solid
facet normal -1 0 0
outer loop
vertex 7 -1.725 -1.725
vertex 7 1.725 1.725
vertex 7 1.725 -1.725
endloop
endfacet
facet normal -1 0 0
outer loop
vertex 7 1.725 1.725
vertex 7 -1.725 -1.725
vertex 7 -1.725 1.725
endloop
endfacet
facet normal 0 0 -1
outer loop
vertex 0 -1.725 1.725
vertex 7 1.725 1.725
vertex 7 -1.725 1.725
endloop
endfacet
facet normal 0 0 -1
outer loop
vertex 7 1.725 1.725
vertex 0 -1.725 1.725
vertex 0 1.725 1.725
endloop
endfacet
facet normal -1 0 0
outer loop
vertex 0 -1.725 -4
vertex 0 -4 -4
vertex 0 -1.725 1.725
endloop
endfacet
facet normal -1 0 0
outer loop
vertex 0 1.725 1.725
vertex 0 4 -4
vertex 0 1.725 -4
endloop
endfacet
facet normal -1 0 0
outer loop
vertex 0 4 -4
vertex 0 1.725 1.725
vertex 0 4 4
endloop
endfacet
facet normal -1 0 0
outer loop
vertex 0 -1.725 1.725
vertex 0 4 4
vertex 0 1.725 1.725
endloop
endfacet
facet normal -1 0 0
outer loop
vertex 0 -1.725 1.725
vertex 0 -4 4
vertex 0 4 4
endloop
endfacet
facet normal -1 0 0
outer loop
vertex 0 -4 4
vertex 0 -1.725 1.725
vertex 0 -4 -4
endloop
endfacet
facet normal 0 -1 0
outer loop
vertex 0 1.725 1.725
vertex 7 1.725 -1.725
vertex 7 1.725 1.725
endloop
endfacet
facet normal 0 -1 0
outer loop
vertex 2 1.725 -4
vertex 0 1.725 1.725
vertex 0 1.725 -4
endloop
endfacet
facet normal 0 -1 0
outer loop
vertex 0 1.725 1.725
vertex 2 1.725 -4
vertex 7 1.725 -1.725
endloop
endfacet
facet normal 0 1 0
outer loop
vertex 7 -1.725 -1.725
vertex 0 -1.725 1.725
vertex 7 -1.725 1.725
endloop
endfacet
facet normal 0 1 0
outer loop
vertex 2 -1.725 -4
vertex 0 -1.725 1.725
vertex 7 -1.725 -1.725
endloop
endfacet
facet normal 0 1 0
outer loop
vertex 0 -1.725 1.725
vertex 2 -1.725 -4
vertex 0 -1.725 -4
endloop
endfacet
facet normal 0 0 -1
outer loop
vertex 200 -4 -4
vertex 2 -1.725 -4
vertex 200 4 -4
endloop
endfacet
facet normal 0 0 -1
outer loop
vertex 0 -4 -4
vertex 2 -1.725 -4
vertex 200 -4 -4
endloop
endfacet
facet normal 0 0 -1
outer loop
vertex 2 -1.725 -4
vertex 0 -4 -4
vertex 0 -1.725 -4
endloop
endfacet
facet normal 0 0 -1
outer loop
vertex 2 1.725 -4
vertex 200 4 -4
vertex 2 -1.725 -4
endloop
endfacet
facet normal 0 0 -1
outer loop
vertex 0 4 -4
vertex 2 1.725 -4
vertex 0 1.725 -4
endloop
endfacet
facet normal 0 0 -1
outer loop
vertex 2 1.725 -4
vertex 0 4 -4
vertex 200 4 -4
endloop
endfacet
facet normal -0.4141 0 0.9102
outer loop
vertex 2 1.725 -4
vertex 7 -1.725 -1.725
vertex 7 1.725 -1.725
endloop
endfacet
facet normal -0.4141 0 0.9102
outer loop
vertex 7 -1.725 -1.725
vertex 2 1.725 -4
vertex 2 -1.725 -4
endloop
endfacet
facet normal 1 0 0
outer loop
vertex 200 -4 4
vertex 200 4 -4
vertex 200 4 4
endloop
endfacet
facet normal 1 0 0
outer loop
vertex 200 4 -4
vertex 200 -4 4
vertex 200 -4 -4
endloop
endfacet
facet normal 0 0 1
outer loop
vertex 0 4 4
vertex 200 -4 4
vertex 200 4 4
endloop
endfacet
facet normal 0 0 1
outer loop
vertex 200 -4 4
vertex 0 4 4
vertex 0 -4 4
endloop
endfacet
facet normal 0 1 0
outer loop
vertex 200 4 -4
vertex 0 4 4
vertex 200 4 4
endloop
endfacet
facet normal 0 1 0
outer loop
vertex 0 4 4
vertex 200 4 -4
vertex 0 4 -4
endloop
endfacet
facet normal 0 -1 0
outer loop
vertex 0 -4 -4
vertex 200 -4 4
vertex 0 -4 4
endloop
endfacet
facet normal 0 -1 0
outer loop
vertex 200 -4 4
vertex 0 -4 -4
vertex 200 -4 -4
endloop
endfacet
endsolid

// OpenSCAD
OUTER_SHAPE_WIDTH=8;
OUTER_SHAPE_HEIGHT=8;
INNER_CUBE_THICKNESS=3.5;
INNER_CUBE_LENGTH=7;

HULL_CONNECTOR_LENGTH=2;

ENTRY_ANGLE=45;
MAX_PIECE_SIZE=200;

FIT_WIDTH=0.05;
FIT_ON_MALE=1;

module male_connector()
{
    translate([INNER_CUBE_LENGTH/2,0,0]) cube([INNER_CUBE_LENGTH,INNER_CUBE_THICKNESS-FIT_ON_MALE*FIT_WIDTH,INNER_CUBE_THICKNESS-FIT_ON_MALE*FIT_WIDTH],center=true);
    translate([-MAX_PIECE_SIZE/2,0,0]) cube([MAX_PIECE_SIZE,OUTER_SHAPE_WIDTH,OUTER_SHAPE_HEIGHT],center=true);
    hull(){
    translate([INNER_CUBE_LENGTH-HULL_CONNECTOR_LENGTH/2,0,0]) color([1,0,0]) cube([HULL_CONNECTOR_LENGTH,INNER_CUBE_THICKNESS-FIT_ON_MALE*FIT_WIDTH,INNER_CUBE_THICKNESS-FIT_ON_MALE*FIT_WIDTH],center=true);
    translate([HULL_CONNECTOR_LENGTH/2,0,OUTER_SHAPE_HEIGHT/4-OUTER_SHAPE_HEIGHT/2]) color([0,1,0]) cube([HULL_CONNECTOR_LENGTH,INNER_CUBE_THICKNESS-FIT_ON_MALE*FIT_WIDTH,OUTER_SHAPE_HEIGHT/2],center=true);
    }
}

module female_connector()
{
    difference()
    {
    translate([MAX_PIECE_SIZE/2,0,0]) color([1,0,0]) cube([MAX_PIECE_SIZE,OUTER_SHAPE_WIDTH,OUTER_SHAPE_HEIGHT],center=true);
    male_connector();
    }
}
//translate([0,10,0]) male_connector();
female_connector();
